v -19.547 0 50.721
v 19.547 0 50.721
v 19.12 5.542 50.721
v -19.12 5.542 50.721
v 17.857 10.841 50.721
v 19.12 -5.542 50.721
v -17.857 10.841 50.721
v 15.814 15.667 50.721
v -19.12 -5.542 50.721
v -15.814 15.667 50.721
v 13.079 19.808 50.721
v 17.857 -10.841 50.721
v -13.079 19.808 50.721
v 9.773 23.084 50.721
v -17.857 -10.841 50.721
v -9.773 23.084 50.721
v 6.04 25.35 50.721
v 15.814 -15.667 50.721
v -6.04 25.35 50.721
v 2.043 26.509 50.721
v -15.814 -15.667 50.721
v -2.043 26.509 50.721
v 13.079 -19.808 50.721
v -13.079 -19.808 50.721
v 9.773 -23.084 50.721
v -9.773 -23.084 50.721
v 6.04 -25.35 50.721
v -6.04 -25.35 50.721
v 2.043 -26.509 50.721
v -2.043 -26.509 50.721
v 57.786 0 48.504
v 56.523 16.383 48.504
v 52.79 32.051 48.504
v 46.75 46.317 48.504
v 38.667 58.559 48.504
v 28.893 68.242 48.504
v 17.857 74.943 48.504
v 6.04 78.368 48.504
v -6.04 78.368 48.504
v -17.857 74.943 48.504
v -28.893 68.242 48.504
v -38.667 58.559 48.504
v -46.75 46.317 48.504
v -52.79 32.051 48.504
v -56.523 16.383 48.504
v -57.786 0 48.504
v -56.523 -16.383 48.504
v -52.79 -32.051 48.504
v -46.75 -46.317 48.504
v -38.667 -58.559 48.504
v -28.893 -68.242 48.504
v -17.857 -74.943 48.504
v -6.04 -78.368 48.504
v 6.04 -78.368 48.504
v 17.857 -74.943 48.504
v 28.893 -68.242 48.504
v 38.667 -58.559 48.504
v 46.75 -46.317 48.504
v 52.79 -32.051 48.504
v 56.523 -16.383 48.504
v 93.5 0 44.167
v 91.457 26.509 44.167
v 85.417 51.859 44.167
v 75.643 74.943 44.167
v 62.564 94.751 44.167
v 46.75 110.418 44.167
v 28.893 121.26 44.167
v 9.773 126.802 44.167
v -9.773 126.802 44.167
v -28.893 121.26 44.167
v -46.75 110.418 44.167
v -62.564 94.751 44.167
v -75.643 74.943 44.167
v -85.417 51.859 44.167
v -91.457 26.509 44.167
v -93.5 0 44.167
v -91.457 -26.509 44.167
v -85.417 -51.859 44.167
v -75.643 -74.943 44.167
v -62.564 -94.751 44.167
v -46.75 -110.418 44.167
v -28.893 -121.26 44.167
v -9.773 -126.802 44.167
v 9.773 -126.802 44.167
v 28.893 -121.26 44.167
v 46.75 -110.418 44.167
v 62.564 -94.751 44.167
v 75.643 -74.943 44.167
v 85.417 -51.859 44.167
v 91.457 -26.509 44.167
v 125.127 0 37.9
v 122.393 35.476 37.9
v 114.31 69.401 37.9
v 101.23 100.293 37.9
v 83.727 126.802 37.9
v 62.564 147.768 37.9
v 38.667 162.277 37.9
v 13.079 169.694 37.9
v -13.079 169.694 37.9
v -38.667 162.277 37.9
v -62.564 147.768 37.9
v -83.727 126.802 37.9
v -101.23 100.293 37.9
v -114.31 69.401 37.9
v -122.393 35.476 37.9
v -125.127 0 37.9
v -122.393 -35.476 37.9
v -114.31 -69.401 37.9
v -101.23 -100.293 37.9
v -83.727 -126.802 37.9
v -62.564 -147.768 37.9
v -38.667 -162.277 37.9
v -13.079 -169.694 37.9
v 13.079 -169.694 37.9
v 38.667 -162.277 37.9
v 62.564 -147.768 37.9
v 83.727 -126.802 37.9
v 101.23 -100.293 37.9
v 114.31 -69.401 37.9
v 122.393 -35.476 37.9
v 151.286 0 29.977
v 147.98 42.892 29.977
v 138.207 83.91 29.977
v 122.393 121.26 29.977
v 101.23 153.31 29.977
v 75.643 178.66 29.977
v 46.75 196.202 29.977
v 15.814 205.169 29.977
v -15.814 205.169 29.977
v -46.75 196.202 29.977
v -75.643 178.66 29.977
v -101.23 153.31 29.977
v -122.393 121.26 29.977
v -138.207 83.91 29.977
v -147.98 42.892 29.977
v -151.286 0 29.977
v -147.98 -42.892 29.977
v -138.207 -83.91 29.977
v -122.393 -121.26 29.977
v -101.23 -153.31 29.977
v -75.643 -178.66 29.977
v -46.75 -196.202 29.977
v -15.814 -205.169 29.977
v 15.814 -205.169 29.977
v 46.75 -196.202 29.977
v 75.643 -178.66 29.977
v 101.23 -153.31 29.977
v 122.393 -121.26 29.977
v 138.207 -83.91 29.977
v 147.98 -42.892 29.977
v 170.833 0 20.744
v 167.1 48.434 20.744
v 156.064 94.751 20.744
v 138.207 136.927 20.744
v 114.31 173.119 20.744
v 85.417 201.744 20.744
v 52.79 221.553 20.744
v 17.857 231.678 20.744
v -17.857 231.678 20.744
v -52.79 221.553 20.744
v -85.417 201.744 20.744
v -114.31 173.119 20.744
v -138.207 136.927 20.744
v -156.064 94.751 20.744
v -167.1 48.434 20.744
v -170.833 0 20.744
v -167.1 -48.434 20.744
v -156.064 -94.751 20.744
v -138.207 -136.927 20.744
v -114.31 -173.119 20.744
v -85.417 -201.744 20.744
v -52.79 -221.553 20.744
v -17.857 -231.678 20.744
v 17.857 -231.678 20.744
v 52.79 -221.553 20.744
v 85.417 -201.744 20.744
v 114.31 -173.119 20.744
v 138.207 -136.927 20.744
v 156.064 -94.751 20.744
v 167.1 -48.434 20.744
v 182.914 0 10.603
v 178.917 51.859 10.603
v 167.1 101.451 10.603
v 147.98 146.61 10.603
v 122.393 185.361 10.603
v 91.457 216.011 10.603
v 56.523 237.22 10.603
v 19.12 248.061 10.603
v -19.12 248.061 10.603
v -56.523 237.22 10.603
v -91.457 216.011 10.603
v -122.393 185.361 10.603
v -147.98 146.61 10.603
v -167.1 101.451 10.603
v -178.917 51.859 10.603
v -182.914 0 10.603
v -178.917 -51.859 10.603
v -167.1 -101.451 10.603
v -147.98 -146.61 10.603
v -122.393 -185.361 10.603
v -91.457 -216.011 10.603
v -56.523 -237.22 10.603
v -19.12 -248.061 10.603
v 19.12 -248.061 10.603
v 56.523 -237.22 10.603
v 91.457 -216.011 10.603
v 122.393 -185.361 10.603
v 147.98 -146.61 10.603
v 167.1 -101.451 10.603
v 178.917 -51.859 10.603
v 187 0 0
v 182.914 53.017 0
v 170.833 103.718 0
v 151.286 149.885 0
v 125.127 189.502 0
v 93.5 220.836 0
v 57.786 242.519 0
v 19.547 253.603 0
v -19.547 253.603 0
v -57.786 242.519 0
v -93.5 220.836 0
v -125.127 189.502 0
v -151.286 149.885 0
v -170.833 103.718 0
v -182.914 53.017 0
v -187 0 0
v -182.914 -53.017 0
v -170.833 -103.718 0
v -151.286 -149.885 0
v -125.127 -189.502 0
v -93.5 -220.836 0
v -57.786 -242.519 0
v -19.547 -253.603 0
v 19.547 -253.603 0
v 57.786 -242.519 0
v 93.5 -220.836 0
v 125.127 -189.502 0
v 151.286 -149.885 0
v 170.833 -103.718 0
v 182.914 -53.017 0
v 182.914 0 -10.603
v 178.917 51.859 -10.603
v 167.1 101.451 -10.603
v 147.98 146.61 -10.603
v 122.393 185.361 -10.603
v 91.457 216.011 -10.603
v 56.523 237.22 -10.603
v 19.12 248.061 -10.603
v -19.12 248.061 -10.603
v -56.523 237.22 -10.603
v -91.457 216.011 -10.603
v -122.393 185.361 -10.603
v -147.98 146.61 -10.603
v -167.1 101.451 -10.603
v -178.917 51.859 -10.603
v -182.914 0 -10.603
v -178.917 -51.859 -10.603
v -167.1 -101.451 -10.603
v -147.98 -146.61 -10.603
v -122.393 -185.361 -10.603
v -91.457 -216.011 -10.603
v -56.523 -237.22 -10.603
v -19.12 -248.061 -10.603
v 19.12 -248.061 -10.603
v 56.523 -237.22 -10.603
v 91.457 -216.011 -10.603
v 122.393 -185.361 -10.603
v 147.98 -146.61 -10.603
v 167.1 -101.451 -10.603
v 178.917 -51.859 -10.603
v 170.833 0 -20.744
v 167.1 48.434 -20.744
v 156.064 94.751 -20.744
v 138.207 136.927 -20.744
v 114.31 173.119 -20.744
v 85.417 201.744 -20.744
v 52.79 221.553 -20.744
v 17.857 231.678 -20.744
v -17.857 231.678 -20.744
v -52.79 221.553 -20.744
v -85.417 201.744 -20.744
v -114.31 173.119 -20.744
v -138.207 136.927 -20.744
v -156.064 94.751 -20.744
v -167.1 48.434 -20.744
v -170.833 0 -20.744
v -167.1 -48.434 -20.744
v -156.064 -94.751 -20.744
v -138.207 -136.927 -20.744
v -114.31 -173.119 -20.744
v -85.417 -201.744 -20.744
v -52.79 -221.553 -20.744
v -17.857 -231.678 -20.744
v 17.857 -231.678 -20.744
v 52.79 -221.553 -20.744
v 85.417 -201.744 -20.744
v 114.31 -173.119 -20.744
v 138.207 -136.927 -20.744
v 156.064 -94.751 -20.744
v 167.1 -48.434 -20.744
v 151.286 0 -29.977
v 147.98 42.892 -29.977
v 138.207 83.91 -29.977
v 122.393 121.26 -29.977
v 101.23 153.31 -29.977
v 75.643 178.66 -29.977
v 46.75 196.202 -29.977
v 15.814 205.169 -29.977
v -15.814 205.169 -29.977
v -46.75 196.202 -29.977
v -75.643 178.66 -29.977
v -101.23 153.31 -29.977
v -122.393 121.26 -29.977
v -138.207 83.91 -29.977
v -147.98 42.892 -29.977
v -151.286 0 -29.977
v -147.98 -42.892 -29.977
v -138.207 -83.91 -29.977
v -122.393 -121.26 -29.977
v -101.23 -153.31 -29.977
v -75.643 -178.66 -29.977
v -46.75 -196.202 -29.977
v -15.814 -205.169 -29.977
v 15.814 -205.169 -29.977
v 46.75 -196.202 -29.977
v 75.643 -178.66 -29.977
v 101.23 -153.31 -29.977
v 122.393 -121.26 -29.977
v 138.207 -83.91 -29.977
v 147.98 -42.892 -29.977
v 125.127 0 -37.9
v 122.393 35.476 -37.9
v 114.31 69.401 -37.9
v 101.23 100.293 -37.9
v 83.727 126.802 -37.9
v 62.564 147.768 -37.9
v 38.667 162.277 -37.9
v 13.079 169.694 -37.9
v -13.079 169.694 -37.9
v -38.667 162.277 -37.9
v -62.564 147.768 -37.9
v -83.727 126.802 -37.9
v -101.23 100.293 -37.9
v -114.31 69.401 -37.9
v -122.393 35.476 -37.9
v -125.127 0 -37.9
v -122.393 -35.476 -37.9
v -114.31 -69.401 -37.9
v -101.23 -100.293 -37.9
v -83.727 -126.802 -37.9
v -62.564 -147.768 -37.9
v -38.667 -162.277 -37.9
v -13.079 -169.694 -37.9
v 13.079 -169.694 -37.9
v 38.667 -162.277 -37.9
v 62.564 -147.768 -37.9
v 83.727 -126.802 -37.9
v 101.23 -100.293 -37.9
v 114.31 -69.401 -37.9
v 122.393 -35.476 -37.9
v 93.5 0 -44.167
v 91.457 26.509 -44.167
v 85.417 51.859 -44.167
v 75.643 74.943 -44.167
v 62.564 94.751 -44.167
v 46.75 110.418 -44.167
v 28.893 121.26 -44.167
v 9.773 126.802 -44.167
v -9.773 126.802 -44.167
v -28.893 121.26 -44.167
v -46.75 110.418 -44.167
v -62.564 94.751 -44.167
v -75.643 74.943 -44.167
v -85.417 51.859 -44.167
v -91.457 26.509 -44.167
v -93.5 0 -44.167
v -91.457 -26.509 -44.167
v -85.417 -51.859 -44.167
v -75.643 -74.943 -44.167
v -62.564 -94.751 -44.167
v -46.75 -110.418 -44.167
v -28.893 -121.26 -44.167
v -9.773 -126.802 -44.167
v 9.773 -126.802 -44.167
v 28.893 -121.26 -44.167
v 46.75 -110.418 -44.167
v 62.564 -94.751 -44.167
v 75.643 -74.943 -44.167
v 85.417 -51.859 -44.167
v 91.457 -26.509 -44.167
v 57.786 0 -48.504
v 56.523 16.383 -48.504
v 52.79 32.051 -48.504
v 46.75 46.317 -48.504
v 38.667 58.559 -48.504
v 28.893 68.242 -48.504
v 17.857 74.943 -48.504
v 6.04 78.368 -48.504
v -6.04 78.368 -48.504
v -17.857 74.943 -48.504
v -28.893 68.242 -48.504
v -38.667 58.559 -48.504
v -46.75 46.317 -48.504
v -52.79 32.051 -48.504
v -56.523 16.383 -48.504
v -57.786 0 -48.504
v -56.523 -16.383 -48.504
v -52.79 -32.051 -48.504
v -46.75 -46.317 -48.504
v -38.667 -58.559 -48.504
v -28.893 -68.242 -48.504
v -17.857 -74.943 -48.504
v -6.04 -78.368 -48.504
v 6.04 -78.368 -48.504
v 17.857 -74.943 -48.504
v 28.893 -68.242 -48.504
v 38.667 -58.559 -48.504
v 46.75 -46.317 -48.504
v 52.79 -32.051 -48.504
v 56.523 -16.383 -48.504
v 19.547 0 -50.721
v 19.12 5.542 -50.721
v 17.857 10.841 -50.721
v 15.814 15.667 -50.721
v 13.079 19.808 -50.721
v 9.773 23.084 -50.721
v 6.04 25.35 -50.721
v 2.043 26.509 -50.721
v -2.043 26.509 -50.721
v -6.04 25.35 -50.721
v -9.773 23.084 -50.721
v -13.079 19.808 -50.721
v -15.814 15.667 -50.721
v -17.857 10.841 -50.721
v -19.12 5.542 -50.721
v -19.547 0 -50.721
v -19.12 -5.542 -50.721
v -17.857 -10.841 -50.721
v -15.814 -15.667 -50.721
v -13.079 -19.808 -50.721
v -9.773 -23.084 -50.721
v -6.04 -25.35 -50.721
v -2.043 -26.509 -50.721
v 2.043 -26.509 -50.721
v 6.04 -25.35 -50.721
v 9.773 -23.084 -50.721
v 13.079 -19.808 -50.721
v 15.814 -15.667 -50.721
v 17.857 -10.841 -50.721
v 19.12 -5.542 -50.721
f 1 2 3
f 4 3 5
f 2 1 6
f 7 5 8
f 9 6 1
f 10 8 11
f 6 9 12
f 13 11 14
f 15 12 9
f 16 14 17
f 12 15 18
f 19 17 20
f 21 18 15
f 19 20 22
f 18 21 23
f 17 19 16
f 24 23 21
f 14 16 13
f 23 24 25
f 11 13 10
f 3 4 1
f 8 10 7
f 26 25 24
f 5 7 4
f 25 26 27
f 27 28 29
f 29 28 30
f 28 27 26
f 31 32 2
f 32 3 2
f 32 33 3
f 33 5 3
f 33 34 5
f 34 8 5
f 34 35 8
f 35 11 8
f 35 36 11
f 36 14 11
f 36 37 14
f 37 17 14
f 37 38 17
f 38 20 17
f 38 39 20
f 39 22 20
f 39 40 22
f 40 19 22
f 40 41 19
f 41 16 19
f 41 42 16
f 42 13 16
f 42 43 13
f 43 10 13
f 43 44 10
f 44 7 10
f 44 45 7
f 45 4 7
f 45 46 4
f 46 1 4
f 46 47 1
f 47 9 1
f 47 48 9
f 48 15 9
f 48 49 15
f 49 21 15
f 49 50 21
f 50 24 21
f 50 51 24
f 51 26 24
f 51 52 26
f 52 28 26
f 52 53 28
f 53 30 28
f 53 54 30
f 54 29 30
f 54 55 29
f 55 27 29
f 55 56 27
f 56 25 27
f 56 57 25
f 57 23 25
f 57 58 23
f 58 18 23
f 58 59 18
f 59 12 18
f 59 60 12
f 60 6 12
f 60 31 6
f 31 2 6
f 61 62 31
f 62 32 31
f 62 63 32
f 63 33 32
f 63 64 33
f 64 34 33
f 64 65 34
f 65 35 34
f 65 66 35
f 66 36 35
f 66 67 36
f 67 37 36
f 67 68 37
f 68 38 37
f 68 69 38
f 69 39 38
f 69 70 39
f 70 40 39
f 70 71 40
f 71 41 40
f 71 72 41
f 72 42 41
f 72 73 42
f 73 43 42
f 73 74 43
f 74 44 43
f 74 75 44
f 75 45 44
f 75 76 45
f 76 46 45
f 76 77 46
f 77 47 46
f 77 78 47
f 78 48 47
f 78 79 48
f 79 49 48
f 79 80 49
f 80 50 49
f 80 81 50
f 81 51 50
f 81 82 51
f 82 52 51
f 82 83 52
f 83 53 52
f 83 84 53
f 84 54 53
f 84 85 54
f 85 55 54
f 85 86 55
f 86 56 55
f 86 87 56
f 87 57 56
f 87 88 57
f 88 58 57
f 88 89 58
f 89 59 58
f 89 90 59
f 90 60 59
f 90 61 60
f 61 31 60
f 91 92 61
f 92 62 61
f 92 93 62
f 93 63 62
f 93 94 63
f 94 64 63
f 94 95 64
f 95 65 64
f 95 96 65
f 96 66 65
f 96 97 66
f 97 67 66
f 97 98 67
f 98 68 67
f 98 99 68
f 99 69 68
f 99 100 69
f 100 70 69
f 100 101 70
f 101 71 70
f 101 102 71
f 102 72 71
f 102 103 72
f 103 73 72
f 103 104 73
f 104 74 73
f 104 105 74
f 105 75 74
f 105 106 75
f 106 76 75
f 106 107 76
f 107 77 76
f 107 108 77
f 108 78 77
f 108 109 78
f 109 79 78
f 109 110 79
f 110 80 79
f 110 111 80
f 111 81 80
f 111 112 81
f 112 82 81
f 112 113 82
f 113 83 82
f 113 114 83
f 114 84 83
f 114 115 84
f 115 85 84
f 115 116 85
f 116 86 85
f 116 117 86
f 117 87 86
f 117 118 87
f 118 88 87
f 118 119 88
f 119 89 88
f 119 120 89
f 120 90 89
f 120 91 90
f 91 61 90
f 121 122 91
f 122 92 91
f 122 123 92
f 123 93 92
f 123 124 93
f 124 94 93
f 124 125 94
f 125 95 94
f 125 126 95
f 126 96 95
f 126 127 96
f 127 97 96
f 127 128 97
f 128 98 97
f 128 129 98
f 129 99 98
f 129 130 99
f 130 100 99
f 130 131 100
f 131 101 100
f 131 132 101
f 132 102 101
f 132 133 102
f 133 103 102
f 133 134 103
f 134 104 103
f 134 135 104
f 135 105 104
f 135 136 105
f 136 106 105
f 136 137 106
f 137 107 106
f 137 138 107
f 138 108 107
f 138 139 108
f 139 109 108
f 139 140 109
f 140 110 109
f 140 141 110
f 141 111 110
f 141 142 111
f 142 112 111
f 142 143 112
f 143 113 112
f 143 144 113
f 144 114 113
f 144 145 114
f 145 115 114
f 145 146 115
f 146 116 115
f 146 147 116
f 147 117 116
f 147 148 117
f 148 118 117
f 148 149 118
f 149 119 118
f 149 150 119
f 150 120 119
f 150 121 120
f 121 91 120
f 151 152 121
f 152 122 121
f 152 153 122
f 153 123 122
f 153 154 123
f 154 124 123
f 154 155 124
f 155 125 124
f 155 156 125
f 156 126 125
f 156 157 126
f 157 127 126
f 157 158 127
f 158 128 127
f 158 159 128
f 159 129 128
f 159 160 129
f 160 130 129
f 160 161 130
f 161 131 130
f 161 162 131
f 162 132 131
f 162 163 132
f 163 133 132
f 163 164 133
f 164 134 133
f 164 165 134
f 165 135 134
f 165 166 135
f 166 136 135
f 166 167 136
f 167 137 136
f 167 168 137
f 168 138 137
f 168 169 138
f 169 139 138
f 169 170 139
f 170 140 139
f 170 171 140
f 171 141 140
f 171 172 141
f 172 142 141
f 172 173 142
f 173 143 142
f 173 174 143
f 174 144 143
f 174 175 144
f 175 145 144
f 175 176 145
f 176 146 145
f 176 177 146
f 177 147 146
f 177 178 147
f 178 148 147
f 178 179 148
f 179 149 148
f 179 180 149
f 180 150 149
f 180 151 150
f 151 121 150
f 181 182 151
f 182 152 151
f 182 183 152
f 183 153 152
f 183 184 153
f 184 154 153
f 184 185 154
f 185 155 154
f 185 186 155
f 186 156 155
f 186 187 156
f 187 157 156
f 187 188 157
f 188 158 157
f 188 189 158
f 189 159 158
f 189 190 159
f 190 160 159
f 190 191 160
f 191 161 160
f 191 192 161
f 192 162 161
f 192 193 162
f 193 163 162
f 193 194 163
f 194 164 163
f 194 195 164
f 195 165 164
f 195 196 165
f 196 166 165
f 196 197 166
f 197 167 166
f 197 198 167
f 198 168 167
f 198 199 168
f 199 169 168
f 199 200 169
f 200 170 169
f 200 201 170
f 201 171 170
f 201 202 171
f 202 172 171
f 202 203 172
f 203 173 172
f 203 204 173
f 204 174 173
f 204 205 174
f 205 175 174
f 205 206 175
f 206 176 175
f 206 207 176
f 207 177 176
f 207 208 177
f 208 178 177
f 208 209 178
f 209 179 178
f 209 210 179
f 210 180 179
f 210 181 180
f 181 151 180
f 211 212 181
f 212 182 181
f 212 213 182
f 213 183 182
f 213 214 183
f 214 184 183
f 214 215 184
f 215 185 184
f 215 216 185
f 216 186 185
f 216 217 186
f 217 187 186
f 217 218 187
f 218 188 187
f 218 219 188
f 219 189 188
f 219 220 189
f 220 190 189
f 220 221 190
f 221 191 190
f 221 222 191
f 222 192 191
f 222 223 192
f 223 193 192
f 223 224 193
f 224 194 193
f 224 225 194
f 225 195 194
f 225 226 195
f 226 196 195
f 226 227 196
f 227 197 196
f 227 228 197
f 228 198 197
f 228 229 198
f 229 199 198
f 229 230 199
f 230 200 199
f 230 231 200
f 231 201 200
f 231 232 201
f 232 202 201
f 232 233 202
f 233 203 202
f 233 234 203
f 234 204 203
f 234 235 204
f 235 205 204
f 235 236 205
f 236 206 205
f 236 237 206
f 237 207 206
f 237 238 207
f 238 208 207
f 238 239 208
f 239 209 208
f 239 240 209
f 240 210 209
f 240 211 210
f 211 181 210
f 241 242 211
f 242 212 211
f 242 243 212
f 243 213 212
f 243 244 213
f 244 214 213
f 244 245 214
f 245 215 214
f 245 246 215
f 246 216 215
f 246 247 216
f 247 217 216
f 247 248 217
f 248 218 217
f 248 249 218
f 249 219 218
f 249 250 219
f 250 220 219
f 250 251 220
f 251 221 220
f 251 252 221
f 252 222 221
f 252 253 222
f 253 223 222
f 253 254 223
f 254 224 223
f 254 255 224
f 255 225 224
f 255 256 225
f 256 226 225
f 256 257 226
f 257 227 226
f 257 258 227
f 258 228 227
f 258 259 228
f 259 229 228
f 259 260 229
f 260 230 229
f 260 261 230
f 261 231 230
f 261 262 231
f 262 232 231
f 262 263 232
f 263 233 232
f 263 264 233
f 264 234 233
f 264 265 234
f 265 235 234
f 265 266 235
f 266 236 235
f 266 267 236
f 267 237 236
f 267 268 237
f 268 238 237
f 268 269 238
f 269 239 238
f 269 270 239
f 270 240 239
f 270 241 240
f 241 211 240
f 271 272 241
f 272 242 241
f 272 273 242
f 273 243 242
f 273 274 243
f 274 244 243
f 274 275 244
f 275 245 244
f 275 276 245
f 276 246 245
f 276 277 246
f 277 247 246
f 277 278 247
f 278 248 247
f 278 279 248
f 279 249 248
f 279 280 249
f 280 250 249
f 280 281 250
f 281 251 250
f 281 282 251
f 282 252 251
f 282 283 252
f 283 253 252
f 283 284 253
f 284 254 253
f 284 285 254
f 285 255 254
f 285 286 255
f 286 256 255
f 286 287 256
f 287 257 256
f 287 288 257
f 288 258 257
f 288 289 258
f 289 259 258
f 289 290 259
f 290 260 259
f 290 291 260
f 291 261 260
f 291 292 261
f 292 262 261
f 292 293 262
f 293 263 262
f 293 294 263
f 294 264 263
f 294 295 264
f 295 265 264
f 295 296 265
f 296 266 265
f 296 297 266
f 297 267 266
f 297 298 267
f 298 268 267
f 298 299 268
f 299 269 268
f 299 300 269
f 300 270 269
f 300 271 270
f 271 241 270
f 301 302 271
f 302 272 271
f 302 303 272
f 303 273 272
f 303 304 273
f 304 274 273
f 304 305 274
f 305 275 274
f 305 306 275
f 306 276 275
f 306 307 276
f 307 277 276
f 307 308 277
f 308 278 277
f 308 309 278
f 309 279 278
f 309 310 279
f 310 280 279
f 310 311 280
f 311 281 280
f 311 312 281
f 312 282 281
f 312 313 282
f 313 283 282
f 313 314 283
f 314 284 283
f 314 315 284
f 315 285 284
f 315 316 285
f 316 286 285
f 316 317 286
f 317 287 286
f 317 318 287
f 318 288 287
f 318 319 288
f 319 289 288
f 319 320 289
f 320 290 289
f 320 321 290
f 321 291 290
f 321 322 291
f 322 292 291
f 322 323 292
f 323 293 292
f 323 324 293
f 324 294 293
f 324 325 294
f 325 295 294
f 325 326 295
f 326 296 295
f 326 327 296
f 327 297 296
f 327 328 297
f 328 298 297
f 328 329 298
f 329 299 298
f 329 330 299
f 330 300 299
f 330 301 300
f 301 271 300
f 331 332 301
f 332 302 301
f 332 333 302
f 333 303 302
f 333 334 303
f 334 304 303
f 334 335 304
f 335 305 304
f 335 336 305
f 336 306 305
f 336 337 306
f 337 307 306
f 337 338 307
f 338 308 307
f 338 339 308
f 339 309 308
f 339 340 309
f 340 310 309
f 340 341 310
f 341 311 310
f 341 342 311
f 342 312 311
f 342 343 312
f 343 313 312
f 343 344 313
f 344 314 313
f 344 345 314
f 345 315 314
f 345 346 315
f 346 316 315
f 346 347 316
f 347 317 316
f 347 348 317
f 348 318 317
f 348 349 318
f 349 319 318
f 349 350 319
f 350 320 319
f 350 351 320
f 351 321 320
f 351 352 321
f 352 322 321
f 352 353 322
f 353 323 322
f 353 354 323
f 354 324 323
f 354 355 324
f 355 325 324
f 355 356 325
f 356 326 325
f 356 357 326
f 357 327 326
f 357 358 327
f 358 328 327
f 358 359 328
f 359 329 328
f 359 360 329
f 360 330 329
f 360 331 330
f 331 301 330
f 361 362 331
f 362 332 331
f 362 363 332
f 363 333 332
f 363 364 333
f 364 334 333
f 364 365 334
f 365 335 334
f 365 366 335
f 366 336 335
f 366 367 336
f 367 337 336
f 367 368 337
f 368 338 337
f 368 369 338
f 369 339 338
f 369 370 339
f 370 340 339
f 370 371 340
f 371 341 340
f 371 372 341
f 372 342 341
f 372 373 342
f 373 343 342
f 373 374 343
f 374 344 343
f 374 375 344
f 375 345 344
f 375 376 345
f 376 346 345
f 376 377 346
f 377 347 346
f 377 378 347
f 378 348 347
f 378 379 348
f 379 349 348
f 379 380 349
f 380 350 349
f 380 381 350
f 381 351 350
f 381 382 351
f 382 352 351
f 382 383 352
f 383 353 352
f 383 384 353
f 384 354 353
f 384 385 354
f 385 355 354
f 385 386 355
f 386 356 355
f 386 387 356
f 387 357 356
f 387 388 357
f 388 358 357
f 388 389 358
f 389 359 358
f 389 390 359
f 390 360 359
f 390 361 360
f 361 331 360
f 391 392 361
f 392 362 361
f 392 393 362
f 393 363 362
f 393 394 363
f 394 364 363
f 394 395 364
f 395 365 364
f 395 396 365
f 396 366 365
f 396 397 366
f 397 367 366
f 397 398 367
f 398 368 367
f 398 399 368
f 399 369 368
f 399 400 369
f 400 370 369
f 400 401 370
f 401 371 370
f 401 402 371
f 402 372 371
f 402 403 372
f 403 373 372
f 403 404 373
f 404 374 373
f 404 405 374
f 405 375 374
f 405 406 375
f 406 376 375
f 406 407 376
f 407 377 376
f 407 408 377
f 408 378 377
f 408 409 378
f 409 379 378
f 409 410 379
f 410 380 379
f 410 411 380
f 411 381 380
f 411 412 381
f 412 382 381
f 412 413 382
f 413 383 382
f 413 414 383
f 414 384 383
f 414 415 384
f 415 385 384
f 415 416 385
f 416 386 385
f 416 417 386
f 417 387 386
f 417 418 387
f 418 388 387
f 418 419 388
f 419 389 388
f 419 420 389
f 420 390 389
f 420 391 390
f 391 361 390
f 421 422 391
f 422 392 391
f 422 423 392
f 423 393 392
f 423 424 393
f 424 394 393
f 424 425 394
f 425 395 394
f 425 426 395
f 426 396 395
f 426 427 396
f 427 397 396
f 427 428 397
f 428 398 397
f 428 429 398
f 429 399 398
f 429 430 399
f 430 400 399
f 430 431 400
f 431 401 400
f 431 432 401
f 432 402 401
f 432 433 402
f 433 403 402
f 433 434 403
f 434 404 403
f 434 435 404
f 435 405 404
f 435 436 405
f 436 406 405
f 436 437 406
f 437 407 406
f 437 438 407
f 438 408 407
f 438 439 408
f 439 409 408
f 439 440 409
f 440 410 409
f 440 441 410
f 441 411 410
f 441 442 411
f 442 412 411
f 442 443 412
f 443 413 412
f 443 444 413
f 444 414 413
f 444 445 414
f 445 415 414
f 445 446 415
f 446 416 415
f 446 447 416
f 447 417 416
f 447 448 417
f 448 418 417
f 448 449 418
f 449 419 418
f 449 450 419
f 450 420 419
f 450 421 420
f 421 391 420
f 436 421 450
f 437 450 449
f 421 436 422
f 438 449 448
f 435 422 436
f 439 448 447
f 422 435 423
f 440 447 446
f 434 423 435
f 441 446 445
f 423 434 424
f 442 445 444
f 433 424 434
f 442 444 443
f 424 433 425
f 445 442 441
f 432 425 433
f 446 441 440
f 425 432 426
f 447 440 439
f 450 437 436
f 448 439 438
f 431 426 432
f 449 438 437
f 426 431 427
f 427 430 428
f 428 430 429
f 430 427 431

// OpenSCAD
// Generated by SolidPython 1.0.1 on 2020-07-29 00:46:50


scale(v = [11, 15, 3]) {
	sphere(r = 17);
}
/***********************************************
*********      SolidPython code:      **********
************************************************
 
# import packages: SolidPython
from solid import *
from solid.utils import *
from itertools import chain, combinations, permutations


class Resize:

    def __init__(self, scad_file):
        self.scad_file = scad_file
        #self.scad_file = import_scad(scad_file)
        # cone/cylinder param:
        self.r1 = 0
        self.r2 = 0
        self.h = 0
        # rectangular prism param:
        self.w = 0
        self.l = 0
        # ellipse param:
        self.r = 0

    # import OpenScad code (file name corresponds to shape)


    # classify shape + parameters
    def assign(self, param1, param2, param3):
        if self.scad_file == 'cone.scad':
            self.r1 = param1
            self.r2 = param2
            self.h = param3
        elif self.scad_file == 'cylinder.scad':
            self.r1 = param1
            self.r2 = param2
            self.h = param3
        elif self.scad_file == 'rectangularPrism.scad':
            self.h = param1
            self.l = param2
            self.w = param3
        else:
            self.r = param1
            self.h = param2

    # resize parameters
    def iterate(self):
        x = range(3, 20, 2)
        i = 1
        if self.scad_file == 'cone.scad':
            tempList = list(permutations(x, 2))
            for temp in tempList:
                param1 = temp[0]
                param2 = temp[1]
                filepath = 'produced_scad_files/' + 'cone' + str(param1) + '_' + str(param2) + '_' + '.scad'
                scad_render_to_file(cylinder(h=param1, r1=param2, r2=0), filepath)

        elif self.scad_file == 'cylinder.scad':
            tempList = list(permutations(x, 3))
            for temp in tempList:
                param1 = temp[0]
                param2 = temp[1]
                filepath = 'produced_scad_files/' + 'cylinder' + str(param1) + '_' + str(param2) + '_' + '.scad'
                scad_render_to_file(cylinder(h=param1, r1=param2, r2=param2), filepath)

        elif self.scad_file == 'rectangularPrism.scad':
            tempList = list(permutations(x, 3))
            for temp in tempList:
                param1 = temp[0]
                param2 = temp[1]
                param3 = temp[2]
                filepath = 'produced_scad_files/' + 'rectangularPrism' + str(param1) + '_' + str(param2) + '_' + str(
                    param3) + '.scad'
                scad_render_to_file(cube(size=(param1, param2, param3)), filepath)

        elif self.scad_file == 'ellipse.scad':
            tempList = list(permutations(x, 4))
            for temp in tempList:
                param1 = temp[0]
                param2 = temp[1]
                param3 = temp[2]
                param4 = temp[3]
                filepath = 'produced_scad_files/' + 'ellipse' + str(param1) + '_' + str(param2) + '_' + str(param3) + '_' + str(param4) + '.scad'
                scad_render_to_file(scale([param1, param2, param3])(sphere(r=param4)), filepath)

    def render_to_scadfile(self):
        scad_render_to_file(scad, 'example.scad') 
 
************************************************/
